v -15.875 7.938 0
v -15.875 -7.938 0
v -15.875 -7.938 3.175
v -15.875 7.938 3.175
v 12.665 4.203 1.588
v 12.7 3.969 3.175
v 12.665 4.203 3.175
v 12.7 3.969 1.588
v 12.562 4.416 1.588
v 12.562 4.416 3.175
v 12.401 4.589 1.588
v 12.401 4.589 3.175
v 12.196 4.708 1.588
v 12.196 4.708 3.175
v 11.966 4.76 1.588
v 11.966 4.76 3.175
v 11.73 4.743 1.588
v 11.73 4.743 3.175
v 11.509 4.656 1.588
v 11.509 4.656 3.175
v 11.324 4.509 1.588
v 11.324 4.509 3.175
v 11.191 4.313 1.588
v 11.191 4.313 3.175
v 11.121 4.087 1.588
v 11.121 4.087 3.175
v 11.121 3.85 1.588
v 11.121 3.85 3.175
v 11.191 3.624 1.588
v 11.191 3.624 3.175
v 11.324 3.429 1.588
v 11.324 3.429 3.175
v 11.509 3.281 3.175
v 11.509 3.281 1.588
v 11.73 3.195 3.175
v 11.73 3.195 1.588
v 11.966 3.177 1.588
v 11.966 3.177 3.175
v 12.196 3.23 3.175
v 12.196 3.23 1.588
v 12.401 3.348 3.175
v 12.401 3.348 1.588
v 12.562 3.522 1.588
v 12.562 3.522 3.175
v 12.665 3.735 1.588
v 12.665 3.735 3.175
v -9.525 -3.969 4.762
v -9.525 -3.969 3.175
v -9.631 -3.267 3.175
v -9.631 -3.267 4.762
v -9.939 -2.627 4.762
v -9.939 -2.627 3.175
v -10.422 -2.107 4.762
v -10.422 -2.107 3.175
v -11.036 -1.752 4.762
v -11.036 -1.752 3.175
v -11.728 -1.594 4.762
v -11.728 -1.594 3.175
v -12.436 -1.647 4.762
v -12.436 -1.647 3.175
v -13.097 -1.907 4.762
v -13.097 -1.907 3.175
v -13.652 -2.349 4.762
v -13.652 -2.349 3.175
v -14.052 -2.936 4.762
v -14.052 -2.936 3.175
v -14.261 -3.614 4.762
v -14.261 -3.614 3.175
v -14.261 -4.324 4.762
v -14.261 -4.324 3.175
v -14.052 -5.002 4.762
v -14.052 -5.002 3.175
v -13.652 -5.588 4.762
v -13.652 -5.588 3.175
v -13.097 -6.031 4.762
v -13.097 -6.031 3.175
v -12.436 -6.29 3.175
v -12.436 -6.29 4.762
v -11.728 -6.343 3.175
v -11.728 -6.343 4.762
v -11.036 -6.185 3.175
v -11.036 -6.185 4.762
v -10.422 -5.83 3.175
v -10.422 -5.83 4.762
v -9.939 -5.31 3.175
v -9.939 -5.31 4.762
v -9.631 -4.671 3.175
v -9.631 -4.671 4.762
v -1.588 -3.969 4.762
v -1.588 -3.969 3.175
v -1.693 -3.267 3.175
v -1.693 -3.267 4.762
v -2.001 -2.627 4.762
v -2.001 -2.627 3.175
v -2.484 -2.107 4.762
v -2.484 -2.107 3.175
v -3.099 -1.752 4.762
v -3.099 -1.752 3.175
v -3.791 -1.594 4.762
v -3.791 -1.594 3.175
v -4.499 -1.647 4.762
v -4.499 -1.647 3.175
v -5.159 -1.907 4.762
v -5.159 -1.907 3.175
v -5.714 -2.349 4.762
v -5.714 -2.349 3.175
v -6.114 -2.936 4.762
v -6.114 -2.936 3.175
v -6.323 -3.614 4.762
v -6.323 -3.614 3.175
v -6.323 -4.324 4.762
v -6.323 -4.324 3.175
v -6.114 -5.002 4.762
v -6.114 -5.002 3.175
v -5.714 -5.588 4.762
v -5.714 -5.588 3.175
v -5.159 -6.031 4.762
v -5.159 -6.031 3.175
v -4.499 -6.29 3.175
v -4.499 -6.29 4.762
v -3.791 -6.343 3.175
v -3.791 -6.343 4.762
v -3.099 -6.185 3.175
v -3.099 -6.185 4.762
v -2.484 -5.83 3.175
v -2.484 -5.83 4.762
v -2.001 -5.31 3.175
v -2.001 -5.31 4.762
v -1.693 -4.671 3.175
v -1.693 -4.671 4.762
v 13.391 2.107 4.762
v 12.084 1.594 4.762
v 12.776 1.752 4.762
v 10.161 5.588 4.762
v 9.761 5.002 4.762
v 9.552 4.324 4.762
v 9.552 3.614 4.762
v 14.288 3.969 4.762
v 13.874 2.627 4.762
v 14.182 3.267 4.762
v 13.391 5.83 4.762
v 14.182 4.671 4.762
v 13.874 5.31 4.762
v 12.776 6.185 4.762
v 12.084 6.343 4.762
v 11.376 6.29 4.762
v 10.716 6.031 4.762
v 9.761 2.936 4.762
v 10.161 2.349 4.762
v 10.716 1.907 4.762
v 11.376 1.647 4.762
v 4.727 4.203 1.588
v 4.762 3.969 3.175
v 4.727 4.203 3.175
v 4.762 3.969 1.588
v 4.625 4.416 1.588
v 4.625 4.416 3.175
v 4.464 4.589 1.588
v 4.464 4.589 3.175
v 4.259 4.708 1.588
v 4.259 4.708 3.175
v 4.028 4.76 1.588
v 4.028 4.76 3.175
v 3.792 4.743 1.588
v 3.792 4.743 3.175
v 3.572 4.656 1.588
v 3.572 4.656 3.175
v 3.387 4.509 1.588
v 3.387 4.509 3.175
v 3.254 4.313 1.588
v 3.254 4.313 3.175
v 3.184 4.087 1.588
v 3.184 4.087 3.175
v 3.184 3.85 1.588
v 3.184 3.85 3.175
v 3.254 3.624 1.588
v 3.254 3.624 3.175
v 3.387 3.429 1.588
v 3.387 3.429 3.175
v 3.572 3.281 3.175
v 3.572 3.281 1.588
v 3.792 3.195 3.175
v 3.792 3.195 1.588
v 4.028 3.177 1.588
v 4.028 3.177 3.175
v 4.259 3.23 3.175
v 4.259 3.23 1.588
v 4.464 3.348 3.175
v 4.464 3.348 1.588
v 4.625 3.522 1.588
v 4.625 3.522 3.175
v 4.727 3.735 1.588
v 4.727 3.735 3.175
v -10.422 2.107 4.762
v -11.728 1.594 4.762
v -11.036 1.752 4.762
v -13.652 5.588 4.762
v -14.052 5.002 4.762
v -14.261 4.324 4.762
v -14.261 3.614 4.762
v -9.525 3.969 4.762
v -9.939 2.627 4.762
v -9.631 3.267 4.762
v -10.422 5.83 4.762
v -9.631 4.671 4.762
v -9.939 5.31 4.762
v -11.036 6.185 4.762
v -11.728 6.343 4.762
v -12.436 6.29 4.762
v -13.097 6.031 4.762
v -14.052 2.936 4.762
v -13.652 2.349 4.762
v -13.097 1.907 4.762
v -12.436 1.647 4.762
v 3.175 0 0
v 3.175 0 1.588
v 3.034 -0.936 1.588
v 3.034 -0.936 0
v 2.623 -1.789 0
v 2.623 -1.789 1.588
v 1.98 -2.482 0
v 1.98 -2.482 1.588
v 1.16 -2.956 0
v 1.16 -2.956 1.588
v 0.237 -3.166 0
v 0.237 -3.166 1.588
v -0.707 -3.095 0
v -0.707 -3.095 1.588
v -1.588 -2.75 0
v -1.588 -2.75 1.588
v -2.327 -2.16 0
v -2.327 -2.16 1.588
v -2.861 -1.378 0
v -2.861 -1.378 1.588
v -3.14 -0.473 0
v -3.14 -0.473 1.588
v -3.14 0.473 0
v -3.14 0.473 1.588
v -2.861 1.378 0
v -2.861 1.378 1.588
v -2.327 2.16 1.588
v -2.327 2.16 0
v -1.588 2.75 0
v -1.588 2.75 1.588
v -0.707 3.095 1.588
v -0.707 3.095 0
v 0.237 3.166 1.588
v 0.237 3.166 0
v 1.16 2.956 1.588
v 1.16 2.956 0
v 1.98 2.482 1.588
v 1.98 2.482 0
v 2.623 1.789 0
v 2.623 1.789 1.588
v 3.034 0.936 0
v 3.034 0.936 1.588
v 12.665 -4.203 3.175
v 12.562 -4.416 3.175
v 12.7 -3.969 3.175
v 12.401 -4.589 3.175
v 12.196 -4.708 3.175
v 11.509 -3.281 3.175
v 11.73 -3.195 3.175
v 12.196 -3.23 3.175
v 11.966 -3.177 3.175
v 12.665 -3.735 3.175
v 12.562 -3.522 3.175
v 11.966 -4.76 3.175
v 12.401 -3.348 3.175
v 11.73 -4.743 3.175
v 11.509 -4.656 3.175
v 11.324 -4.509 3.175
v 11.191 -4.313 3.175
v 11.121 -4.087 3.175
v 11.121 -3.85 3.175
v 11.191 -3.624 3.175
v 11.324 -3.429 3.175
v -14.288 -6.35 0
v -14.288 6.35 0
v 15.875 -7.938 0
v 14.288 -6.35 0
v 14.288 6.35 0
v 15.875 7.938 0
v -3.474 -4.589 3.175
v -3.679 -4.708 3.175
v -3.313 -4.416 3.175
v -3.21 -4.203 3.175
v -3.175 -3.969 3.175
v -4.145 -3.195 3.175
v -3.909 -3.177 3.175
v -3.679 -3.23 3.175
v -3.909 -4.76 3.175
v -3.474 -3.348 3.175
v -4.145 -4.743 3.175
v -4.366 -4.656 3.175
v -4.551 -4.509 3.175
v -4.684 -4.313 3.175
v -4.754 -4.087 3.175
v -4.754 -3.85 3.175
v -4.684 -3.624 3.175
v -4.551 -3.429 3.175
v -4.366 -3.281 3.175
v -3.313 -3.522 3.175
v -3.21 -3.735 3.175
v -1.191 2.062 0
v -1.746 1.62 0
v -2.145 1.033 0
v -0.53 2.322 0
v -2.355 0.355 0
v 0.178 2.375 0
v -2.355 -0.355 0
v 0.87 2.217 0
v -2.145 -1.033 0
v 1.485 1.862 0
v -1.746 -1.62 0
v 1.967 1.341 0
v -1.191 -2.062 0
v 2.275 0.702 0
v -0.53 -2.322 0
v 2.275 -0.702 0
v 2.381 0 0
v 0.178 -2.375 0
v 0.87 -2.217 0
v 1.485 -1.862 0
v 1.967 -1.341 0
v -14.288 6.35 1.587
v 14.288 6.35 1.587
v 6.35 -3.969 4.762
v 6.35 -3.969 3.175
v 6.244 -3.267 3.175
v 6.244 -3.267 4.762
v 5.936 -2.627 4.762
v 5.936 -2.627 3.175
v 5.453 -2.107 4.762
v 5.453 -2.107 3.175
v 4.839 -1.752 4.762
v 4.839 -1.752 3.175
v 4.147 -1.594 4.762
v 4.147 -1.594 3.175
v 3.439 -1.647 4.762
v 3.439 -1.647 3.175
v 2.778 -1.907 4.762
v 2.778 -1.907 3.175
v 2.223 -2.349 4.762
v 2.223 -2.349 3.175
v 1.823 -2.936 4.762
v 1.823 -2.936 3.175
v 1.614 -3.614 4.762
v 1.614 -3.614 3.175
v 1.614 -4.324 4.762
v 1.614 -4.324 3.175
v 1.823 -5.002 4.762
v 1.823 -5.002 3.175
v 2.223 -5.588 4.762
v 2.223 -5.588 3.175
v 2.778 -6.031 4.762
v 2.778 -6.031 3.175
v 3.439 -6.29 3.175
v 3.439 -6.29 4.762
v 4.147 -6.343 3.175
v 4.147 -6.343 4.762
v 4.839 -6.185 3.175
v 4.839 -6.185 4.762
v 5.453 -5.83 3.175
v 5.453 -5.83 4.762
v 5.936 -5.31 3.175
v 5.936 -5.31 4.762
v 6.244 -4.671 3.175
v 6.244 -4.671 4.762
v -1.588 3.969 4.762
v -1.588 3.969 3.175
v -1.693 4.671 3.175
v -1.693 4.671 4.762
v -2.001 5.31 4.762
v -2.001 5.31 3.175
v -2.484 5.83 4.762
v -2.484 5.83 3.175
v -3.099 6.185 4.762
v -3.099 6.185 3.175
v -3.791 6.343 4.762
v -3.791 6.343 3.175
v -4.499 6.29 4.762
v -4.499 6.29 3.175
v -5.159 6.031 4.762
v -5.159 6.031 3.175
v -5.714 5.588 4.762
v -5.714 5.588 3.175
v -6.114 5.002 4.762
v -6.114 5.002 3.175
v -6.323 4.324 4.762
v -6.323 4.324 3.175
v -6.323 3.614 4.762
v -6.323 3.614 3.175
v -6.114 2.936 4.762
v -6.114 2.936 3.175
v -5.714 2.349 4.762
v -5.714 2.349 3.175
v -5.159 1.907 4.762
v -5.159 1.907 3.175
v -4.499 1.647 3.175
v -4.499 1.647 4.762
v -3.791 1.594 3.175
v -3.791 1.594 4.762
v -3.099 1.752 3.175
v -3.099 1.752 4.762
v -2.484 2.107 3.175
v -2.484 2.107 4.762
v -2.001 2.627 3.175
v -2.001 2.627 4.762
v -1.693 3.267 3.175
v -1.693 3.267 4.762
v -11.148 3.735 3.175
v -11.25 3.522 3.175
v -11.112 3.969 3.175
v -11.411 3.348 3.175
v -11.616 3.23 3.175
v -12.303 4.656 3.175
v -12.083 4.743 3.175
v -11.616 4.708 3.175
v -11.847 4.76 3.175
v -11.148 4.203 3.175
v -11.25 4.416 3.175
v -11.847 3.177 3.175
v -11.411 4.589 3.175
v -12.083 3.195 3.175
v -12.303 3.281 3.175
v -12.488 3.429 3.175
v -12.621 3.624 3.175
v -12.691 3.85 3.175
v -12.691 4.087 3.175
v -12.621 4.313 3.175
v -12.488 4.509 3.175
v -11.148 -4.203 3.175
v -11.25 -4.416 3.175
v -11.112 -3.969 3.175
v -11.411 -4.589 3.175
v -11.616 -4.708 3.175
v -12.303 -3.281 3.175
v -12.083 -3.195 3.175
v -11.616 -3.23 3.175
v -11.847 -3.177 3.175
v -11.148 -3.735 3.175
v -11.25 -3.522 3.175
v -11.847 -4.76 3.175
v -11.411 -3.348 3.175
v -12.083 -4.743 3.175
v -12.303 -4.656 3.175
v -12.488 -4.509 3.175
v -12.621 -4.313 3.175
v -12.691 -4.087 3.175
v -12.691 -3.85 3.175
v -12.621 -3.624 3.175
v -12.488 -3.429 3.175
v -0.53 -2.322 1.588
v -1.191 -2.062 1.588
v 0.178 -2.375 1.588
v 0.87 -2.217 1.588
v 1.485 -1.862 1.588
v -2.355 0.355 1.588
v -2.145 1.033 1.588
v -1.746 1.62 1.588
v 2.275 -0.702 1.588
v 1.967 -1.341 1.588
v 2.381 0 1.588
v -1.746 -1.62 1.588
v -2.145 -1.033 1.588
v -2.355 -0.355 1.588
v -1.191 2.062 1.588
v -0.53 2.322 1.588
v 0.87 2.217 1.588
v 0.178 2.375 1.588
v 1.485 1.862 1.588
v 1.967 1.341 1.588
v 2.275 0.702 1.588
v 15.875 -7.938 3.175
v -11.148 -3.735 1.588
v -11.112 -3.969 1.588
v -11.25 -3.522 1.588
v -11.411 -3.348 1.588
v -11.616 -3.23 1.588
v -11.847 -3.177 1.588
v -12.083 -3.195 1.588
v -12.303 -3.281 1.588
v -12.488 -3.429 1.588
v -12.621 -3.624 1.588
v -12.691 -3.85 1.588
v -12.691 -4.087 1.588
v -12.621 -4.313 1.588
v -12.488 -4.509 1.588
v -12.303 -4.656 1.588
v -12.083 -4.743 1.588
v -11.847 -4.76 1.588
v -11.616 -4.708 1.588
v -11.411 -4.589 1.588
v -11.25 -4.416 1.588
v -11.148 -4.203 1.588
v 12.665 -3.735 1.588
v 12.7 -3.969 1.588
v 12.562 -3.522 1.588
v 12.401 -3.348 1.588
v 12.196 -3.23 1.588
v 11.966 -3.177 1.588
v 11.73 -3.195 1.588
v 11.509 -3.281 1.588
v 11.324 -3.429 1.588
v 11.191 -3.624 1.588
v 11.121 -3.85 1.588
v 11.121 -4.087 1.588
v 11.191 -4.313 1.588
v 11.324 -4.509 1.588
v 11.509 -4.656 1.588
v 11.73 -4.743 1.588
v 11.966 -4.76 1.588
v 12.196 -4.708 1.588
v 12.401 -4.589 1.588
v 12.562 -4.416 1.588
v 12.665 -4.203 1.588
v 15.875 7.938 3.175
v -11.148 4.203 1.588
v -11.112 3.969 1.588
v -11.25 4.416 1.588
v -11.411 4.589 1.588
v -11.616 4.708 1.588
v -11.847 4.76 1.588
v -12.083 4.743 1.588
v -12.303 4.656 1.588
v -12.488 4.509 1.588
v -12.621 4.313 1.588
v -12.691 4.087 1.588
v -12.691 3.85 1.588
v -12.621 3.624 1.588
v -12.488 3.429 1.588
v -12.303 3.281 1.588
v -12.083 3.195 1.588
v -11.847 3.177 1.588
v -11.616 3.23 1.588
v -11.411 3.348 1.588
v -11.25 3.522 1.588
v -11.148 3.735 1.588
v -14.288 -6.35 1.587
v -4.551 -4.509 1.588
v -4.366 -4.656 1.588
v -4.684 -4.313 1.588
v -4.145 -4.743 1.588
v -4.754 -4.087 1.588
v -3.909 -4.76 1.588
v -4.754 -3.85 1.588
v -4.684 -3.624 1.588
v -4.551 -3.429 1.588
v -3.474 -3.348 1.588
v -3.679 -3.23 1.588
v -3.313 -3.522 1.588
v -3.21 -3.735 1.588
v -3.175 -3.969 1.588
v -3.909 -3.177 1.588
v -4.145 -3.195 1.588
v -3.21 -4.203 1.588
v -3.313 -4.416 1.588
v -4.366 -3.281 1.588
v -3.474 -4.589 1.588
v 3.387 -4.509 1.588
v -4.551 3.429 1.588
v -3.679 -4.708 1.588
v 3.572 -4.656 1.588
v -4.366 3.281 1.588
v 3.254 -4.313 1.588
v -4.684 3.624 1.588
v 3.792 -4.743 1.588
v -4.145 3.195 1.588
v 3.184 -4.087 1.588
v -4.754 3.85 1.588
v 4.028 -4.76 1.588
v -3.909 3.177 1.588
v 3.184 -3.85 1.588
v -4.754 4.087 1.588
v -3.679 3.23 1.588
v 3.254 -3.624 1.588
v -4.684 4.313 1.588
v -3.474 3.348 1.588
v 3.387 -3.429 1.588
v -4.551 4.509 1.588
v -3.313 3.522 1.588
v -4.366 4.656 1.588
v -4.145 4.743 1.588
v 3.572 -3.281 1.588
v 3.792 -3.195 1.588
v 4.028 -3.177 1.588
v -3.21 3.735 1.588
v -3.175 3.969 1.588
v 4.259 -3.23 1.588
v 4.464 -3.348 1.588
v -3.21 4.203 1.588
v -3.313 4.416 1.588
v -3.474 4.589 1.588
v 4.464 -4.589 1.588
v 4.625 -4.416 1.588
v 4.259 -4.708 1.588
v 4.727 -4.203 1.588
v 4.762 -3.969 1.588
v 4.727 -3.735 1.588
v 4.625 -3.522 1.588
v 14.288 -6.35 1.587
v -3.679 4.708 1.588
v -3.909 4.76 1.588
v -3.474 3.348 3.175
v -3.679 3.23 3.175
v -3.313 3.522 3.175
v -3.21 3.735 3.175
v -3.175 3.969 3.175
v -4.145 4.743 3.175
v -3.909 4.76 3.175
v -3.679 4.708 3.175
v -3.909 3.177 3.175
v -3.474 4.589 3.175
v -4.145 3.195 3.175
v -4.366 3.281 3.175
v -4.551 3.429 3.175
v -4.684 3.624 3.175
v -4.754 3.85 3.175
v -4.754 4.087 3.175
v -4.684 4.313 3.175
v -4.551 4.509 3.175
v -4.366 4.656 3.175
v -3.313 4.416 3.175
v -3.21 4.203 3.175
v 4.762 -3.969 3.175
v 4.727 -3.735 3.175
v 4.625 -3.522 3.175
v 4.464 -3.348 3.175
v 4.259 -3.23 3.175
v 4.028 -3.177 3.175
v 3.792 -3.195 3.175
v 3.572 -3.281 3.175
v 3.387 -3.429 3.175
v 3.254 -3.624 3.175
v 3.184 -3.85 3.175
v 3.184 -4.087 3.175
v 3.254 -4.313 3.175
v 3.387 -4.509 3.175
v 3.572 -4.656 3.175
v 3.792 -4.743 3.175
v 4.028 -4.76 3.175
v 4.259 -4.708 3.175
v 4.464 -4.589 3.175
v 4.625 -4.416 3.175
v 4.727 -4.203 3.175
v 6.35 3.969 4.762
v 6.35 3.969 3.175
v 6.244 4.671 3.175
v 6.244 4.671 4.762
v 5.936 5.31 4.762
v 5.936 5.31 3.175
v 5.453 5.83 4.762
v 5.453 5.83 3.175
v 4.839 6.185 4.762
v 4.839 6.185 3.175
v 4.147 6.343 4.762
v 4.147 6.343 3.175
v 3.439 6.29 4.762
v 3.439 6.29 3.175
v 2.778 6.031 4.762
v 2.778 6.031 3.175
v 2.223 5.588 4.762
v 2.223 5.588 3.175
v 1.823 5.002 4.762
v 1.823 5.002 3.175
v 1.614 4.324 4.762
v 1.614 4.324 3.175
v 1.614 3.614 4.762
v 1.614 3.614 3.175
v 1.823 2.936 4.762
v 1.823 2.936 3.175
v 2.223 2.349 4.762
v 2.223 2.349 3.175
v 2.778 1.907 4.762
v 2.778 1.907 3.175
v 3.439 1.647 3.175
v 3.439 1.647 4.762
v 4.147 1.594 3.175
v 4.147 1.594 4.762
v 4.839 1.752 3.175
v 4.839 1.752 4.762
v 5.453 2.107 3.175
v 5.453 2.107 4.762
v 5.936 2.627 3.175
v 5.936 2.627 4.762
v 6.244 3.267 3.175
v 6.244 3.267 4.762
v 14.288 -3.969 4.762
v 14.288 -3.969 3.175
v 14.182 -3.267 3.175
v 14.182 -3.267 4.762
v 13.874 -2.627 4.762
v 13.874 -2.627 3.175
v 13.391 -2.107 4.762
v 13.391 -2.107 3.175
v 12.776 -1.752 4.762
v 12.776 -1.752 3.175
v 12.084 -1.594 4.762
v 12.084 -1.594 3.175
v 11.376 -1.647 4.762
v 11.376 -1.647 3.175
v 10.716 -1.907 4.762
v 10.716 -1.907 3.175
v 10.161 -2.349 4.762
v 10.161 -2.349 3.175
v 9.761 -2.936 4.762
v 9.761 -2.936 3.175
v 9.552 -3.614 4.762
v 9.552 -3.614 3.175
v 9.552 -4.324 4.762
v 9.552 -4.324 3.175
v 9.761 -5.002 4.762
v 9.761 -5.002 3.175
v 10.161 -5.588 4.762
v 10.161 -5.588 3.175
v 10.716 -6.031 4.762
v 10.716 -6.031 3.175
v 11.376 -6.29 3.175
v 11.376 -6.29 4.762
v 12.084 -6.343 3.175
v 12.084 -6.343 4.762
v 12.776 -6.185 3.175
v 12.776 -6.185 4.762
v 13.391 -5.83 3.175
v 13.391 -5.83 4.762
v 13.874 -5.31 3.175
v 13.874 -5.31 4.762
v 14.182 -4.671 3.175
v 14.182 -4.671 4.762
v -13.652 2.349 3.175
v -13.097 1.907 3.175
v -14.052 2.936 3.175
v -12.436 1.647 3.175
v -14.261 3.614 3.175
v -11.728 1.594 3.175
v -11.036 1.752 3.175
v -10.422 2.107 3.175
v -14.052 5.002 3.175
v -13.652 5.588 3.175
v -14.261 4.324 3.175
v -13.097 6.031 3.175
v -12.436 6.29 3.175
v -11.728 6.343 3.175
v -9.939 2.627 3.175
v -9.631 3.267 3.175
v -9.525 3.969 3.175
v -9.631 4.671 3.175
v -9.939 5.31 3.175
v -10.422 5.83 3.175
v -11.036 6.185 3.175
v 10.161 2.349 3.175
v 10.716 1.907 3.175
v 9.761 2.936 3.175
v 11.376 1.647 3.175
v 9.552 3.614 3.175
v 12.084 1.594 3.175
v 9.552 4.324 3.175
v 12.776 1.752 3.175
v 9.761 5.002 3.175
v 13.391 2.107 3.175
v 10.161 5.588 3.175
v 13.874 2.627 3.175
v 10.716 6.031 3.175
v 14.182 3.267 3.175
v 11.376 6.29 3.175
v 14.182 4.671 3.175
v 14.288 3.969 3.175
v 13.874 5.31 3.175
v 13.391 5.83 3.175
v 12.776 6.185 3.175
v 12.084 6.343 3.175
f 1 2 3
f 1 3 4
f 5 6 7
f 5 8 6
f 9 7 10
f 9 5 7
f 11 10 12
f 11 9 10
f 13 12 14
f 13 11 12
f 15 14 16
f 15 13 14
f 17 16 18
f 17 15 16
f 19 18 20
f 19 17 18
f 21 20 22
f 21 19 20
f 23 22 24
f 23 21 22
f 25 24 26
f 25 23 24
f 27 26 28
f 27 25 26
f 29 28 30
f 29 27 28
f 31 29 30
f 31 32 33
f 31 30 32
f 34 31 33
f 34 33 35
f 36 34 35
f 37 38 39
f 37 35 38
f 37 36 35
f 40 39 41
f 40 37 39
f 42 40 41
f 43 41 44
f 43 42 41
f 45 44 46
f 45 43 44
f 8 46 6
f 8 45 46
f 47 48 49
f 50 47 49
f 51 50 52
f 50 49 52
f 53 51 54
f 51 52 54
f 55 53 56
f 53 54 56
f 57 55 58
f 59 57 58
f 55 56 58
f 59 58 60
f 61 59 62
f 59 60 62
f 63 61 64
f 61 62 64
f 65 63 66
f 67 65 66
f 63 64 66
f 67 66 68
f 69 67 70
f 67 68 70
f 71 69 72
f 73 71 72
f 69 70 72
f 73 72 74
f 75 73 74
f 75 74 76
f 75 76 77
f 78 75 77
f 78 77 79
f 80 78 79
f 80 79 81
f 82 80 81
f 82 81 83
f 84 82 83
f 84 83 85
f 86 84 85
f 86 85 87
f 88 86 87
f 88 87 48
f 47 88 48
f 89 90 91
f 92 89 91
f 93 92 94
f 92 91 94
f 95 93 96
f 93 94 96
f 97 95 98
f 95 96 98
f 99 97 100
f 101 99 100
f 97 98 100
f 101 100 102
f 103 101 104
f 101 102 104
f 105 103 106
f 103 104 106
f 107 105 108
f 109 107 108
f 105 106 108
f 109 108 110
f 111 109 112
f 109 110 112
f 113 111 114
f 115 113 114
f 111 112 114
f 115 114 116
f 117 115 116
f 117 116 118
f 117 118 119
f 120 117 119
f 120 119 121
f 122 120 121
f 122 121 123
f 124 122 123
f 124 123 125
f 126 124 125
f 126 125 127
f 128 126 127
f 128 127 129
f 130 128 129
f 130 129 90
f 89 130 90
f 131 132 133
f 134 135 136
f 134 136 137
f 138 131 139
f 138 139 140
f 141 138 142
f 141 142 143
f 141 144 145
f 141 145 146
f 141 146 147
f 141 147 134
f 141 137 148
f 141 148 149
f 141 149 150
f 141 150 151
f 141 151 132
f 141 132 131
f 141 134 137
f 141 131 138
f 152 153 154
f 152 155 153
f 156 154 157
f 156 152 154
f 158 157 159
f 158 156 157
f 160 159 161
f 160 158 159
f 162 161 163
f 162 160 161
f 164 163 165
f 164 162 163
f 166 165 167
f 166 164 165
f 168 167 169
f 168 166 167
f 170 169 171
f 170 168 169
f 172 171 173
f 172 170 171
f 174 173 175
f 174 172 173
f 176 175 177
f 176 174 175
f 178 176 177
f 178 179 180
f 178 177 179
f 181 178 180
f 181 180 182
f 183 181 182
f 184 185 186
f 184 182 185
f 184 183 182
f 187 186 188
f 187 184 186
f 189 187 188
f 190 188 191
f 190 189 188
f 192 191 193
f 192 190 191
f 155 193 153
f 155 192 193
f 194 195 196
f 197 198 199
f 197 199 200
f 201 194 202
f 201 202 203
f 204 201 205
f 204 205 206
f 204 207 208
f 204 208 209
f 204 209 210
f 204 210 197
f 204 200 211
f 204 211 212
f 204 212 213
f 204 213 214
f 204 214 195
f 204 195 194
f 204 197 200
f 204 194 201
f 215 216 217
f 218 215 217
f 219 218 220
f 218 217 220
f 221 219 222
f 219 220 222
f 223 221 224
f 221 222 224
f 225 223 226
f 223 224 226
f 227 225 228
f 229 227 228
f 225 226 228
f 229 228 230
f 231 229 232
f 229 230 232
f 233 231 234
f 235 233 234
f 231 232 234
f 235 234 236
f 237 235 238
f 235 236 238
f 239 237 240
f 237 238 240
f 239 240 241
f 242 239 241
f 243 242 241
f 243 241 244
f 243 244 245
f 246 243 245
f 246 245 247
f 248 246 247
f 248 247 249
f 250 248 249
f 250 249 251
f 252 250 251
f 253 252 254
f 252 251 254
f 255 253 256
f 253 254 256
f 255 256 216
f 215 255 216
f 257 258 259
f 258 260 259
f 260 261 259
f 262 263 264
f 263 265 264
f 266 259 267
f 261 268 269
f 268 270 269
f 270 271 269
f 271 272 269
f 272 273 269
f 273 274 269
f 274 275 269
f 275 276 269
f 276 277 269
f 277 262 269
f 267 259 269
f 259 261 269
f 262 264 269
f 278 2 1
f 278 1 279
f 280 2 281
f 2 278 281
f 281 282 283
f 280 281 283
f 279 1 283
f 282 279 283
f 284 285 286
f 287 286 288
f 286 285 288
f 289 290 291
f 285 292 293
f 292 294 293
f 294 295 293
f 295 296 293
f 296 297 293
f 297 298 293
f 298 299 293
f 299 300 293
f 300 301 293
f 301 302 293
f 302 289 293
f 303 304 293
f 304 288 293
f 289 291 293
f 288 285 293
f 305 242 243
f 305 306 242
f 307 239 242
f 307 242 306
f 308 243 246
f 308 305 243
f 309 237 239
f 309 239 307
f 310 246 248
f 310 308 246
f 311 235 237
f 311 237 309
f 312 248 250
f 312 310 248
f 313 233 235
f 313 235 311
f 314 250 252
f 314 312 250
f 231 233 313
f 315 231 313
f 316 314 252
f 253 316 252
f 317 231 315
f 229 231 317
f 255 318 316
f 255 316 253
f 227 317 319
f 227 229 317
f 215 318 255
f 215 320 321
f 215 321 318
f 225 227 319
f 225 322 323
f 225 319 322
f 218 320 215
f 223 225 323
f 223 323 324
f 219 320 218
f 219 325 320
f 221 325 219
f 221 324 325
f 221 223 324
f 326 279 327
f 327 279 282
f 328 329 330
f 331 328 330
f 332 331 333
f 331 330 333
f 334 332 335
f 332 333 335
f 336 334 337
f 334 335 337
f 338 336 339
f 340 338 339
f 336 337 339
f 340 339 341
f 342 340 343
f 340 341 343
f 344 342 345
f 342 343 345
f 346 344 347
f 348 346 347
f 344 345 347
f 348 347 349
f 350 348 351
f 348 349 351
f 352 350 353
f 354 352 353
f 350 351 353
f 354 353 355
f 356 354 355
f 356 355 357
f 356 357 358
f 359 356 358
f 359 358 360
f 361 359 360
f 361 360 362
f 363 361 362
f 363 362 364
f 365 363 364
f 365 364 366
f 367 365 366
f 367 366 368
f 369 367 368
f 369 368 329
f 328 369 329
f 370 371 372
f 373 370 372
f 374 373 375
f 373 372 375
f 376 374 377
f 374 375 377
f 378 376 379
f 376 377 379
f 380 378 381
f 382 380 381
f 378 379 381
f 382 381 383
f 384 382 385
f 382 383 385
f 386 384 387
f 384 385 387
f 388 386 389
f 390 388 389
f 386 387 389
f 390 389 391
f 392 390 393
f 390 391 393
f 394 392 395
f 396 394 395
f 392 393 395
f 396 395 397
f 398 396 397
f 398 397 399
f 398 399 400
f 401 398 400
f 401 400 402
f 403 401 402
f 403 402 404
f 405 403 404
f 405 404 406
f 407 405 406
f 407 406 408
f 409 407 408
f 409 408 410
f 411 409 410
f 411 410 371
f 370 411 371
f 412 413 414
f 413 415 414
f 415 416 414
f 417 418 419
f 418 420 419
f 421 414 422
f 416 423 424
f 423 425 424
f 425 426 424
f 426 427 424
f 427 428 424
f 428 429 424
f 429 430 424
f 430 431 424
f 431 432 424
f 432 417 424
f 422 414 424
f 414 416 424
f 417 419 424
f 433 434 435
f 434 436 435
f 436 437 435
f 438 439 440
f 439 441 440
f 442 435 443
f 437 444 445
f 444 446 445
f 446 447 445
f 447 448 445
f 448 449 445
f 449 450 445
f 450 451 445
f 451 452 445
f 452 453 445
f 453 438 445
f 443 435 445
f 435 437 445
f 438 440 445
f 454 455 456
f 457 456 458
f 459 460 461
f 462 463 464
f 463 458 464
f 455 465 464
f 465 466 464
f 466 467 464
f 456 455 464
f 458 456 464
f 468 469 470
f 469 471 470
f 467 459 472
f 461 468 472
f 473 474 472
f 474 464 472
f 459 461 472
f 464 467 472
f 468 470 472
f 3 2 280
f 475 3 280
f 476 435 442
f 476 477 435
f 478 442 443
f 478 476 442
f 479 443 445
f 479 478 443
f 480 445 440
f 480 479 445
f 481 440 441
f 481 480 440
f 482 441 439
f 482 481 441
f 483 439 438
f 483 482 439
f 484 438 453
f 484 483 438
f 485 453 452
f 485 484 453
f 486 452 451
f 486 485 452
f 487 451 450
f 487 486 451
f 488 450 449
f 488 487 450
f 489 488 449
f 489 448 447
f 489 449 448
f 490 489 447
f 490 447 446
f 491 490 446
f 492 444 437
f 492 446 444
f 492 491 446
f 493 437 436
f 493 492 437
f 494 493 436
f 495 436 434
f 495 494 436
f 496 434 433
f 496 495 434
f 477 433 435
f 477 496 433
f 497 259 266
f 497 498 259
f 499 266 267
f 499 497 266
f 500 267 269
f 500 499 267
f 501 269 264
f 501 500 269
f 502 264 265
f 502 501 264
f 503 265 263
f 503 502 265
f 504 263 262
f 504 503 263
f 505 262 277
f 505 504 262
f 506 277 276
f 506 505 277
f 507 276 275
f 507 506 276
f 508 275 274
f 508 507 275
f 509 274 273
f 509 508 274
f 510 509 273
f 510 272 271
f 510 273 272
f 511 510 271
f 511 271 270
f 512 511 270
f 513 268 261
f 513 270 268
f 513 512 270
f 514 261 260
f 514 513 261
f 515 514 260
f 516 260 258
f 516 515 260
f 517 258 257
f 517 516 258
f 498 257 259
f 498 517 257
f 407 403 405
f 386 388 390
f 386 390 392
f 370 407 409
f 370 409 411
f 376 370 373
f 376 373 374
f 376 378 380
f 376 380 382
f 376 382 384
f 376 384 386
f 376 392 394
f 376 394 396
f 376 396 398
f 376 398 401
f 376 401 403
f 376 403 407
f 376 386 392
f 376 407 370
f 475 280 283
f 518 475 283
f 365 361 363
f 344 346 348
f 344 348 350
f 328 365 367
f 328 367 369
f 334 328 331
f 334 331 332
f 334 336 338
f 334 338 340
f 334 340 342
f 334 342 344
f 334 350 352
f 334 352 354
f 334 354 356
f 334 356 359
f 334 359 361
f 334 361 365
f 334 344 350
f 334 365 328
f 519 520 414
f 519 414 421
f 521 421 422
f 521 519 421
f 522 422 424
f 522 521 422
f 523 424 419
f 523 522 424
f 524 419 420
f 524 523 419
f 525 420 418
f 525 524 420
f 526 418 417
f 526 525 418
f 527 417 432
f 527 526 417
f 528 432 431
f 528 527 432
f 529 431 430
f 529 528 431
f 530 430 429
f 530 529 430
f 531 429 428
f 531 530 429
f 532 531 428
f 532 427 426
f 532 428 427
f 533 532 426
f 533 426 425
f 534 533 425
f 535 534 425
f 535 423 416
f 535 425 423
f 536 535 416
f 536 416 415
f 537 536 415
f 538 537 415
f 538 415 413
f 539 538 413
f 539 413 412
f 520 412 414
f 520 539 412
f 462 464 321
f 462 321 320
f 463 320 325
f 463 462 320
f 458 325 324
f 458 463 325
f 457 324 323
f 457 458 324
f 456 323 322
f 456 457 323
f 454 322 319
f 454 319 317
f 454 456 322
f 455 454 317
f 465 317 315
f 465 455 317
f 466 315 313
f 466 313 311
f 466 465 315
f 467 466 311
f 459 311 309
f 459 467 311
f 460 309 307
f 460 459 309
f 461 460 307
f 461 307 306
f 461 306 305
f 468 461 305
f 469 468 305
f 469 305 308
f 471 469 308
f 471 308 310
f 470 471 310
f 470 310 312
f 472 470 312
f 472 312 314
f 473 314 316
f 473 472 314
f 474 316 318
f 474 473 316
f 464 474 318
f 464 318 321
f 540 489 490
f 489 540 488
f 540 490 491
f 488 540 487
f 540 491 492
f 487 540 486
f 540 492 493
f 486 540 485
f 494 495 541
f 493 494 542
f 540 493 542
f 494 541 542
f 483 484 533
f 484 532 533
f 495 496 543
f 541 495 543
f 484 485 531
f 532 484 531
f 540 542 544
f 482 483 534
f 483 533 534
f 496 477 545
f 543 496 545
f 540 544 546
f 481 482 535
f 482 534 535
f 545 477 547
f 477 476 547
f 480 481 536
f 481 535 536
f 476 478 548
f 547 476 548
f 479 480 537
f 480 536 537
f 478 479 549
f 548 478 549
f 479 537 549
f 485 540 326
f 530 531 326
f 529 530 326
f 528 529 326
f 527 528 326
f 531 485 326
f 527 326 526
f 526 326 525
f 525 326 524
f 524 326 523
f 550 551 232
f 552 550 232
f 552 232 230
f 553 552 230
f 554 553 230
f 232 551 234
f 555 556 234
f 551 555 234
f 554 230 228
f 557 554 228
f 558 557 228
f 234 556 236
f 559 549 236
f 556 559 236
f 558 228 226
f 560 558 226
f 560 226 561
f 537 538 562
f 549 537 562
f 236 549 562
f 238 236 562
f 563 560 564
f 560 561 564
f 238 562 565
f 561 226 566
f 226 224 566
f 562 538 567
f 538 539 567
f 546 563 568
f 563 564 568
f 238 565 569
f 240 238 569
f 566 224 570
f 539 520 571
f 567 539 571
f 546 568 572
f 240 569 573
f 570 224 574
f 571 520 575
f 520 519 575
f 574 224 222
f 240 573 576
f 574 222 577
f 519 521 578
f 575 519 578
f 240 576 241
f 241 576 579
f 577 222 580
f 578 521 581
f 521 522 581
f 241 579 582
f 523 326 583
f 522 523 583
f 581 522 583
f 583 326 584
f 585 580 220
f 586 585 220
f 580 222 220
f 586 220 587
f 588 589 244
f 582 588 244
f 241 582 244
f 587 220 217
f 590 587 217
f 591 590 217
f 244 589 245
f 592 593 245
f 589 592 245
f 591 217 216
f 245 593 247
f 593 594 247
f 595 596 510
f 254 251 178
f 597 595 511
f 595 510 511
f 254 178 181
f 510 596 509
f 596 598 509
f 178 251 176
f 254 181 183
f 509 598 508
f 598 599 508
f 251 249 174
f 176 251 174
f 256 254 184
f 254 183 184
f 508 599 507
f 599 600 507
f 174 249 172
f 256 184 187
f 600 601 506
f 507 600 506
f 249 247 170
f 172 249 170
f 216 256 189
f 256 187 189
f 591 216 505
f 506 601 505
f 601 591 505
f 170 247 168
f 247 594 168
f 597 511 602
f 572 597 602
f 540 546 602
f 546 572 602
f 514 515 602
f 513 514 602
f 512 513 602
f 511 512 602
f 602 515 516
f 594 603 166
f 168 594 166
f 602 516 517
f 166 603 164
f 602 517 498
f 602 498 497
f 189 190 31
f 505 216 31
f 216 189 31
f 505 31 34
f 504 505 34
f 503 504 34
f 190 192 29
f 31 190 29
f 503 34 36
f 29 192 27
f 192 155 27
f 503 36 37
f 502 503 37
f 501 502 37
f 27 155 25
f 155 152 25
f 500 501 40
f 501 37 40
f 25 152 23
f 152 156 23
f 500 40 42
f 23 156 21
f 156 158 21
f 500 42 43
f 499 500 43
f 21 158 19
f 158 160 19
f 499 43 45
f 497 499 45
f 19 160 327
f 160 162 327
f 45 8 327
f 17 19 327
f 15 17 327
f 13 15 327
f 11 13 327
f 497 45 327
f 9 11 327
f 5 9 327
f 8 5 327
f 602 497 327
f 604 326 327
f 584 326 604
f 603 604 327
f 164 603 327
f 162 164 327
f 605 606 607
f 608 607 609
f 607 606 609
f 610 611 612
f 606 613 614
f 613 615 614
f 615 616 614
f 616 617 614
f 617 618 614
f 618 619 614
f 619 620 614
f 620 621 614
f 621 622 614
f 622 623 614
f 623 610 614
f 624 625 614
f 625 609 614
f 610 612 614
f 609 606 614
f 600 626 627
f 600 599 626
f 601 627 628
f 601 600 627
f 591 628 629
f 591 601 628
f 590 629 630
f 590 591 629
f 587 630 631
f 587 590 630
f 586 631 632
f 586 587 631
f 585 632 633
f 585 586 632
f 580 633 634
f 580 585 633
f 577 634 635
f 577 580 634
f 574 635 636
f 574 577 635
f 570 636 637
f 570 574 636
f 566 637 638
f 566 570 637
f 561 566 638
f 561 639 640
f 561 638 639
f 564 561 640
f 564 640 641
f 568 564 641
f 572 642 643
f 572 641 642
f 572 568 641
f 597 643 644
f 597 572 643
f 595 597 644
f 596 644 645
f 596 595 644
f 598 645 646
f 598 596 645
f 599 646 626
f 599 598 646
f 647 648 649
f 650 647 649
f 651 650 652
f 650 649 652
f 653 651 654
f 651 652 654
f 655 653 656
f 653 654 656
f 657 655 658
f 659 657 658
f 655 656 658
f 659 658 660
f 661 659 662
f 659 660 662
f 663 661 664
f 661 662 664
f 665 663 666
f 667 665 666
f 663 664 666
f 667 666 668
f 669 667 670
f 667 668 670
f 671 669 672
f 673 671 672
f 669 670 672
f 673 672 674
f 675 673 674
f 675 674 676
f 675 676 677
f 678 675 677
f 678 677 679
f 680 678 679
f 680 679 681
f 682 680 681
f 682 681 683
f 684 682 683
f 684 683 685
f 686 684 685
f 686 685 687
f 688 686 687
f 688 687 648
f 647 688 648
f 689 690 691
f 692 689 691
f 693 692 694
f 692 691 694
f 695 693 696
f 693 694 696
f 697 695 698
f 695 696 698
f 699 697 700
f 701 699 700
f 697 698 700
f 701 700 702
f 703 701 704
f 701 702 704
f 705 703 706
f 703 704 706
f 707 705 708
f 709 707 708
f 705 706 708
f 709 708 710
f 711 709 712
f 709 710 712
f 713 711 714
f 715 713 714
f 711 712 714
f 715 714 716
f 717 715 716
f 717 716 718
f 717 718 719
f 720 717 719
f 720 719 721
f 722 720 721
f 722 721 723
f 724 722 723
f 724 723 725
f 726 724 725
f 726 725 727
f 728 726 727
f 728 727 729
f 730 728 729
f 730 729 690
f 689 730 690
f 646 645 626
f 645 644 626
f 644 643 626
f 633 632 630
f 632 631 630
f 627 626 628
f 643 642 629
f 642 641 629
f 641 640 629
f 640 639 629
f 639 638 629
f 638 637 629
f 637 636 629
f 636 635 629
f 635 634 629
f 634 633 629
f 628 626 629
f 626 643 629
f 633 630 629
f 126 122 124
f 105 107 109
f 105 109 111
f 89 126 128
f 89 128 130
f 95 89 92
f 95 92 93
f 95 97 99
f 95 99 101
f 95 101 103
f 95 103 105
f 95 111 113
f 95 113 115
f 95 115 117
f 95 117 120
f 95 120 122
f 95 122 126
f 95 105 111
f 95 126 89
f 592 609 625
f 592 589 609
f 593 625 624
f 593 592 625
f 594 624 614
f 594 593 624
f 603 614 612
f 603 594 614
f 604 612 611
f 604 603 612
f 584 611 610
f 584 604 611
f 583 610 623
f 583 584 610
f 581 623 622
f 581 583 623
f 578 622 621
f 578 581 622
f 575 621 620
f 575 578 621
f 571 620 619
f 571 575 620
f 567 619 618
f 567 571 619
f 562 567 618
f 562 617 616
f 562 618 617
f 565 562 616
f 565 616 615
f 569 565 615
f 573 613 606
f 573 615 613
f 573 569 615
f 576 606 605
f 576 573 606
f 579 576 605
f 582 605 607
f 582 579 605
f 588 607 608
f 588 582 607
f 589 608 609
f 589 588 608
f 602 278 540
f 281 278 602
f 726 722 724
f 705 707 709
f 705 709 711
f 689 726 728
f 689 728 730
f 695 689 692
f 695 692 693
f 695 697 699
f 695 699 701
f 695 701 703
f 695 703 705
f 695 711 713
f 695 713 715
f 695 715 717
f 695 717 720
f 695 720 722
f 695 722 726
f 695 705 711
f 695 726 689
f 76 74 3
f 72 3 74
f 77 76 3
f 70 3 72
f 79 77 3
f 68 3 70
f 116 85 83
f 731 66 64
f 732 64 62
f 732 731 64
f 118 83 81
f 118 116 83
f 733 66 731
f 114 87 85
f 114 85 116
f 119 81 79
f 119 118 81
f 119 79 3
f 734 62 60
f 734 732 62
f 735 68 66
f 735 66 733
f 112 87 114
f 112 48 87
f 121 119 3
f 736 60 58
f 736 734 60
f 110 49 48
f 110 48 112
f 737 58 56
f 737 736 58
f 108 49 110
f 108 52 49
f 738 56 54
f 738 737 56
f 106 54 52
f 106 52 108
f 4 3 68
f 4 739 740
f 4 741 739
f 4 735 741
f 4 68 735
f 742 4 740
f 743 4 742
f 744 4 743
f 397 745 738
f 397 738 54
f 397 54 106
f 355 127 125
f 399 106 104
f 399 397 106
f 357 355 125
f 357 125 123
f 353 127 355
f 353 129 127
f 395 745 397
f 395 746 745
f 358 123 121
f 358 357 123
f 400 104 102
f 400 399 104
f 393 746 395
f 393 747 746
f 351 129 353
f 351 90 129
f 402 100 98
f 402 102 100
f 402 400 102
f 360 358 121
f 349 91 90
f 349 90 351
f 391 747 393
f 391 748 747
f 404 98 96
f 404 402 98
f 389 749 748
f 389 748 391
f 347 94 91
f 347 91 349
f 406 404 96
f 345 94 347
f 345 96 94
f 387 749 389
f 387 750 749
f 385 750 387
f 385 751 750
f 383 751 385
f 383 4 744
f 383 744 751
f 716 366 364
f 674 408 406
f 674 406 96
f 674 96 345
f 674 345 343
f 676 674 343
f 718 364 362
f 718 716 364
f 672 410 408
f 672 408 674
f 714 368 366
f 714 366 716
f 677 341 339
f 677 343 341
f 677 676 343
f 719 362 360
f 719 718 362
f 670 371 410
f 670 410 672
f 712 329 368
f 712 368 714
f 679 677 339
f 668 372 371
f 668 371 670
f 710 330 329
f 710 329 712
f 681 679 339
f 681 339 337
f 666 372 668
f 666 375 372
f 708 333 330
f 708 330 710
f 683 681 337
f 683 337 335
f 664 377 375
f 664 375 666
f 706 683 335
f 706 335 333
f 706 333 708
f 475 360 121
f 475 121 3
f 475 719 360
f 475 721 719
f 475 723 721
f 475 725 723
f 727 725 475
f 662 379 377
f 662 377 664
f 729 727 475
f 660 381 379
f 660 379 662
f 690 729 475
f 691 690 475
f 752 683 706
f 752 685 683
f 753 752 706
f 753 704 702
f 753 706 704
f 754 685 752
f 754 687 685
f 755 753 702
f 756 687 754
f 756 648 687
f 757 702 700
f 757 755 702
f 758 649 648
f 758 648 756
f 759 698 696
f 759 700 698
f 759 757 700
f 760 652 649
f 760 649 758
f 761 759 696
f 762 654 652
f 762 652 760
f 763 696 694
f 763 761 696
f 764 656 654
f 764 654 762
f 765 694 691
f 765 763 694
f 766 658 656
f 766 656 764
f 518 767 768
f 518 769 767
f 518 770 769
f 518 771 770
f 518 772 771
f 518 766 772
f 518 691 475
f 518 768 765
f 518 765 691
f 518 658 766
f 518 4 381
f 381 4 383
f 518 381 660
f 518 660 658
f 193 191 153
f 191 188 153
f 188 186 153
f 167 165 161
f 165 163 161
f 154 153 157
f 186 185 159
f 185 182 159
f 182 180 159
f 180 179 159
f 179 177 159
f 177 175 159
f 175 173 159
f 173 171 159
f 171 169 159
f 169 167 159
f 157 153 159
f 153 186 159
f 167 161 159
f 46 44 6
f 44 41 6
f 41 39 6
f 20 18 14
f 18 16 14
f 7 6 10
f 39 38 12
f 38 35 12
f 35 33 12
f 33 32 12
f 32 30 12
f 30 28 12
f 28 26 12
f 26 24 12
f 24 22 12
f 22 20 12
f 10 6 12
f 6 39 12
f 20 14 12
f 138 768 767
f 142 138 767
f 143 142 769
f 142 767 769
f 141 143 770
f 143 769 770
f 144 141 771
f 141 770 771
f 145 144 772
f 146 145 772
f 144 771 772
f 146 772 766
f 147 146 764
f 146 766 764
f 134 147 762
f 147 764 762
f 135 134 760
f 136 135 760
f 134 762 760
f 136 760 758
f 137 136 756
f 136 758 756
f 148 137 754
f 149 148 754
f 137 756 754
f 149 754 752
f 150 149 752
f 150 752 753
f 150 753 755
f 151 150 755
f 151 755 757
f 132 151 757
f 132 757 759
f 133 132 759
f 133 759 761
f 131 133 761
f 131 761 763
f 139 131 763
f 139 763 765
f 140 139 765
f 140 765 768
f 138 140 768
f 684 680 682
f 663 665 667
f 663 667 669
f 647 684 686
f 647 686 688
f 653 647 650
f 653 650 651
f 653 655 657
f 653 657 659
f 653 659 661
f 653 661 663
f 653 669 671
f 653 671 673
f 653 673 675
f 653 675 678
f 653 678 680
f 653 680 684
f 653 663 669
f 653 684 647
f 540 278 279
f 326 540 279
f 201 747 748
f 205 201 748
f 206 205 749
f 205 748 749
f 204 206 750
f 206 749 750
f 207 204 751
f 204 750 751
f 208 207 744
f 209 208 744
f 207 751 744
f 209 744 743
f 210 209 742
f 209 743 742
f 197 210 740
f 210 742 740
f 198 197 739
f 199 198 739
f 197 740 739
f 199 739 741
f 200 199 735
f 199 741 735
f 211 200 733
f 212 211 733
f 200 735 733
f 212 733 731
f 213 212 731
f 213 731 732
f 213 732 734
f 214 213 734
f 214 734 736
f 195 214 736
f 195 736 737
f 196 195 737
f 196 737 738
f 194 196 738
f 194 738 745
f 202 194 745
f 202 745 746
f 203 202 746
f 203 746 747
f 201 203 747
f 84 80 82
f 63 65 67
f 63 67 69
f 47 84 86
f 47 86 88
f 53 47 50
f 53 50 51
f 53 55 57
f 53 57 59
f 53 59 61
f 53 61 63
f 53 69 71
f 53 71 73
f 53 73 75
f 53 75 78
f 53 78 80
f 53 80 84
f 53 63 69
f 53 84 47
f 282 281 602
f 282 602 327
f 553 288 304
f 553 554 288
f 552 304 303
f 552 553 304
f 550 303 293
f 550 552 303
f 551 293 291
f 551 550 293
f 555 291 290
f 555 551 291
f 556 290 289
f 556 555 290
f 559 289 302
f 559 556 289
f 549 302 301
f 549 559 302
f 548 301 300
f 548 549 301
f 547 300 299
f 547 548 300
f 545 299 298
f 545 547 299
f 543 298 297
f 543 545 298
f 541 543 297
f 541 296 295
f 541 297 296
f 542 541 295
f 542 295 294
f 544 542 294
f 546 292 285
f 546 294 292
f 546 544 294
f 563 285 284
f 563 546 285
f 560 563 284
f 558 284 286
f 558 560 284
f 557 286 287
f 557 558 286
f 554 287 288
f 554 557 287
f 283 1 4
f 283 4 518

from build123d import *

# Parameters (mm, degrees)
F0_W     = 31.75
F0_H     = 15.875
F0_R     = 2.38125
F1_DEPTH = 3.175
F2_DEPTH = 4.7625
F3_T     = -1.5875
F4_R     = 3.175
F4_R_2   = 2.38125
F5_DEPTH = 1.5875


with BuildPart() as f1:
    # F0 (on Top) → F1 (new body)
    with BuildSketch(Plane.XY):
        Rectangle(F0_W, F0_H)
        with Locations((-11.90625, -3.96875)):
            Circle(F0_R, mode=Mode.SUBTRACT)
        with Locations((-3.96875, -3.96875)):
            Circle(F0_R, mode=Mode.SUBTRACT)
        with Locations((3.96875, -3.96875)):
            Circle(F0_R, mode=Mode.SUBTRACT)
        with Locations((11.90625, -3.96875)):
            Circle(F0_R, mode=Mode.SUBTRACT)
        with Locations((-11.90625, 3.96875)):
            Circle(F0_R, mode=Mode.SUBTRACT)
        with Locations((-3.96875, 3.96875)):
            Circle(F0_R, mode=Mode.SUBTRACT)
        with Locations((3.96875, 3.96875)):
            Circle(F0_R, mode=Mode.SUBTRACT)
        with Locations((11.90625, 3.96875)):
            Circle(F0_R, mode=Mode.SUBTRACT)
    extrude(amount=F1_DEPTH)

    # F0 (on Top) → F2 (join)
    with BuildSketch(Plane.XY):
        with Locations((-11.90625, 3.96875)):
            Circle(F0_R)
        with Locations((-3.96875, 3.96875)):
            Circle(F0_R)
        with Locations((-3.96875, -3.96875)):
            Circle(F0_R)
        with Locations((-11.90625, -3.96875)):
            Circle(F0_R)
        with Locations((3.96875, 3.96875)):
            Circle(F0_R)
        with Locations((11.90625, 3.96875)):
            Circle(F0_R)
        with Locations((11.90625, -3.96875)):
            Circle(F0_R)
        with Locations((3.96875, -3.96875)):
            Circle(F0_R)
    extrude(amount=F2_DEPTH)

    # F3
    f3_openings = [f1.faces().sort_by_distance(p)[0] for p in [
        (0, 0, 0),
    ]]
    offset(amount=F3_T, openings=f3_openings, kind=Kind.INTERSECTION)

    # F4 (on face) → F5 (join)
    with BuildSketch(Plane(origin=(0, 0, 1.5875), x_dir=(1, 0, 0), z_dir=(0, 0, -1))):
        Circle(F4_R)
        Circle(F4_R_2, mode=Mode.SUBTRACT)
    extrude(amount=F5_DEPTH)


solid = f1.part
